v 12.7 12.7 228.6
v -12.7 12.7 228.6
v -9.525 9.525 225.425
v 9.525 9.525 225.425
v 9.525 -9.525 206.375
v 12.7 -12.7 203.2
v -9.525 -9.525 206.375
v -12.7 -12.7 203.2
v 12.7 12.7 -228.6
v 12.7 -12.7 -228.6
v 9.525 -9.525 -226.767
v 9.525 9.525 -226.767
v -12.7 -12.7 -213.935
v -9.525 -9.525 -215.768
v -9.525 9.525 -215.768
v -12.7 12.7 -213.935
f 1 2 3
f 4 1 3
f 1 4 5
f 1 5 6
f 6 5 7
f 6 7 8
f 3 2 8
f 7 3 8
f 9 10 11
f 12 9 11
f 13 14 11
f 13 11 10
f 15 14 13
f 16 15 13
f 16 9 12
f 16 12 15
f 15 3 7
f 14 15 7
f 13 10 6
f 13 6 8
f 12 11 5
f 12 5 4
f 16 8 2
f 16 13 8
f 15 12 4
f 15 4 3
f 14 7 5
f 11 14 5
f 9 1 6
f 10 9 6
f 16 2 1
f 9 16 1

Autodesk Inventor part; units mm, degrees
ref_plane "YZ Plane" through (0, 0, 0) normal (1, 0, 0) x (0, 1, 0)
ref_plane "XZ Plane" through (0, 0, 0) normal (0, 1, 0) x (-1, 0, 0)
ref_plane "XY Plane" through (0, 0, 0) normal (0, 0, 1) x (1, 0, 0)
sketch "Sketch1" plane through (0, 0, 0) normal (0, 0, 1) x (1, 0, 0)
  line L0 (-17.78, 0) -> (17.78, 0) projected
  line L1 (0, -17.78) -> (0, 17.78) projected
  line L2 (-12.7, 12.7) -> (12.7, 12.7)
  line L3 (12.7, 12.7) -> (12.7, -12.7)
  line L4 (12.7, -12.7) -> (-12.7, -12.7)
  line L5 (-12.7, -12.7) -> (-12.7, 12.7)
  line L6 (9.525, 9.525) -> (-9.525, 9.525)
  line L7 (-9.525, 9.525) -> (-9.525, -9.525)
  line L8 (-9.525, -9.525) -> (9.525, -9.525)
  line L9 (9.525, -9.525) -> (9.525, 9.525)
  point P0 (0, 0)
  point P1 (-12.7, 0)
  point P2 (0, 12.7)
  dimension "d0" = 25.4
  dimension "d1" = 3.175
extrude "Base" add sketch "Sketch1" along normal mid plane 457.2 contours L5 L2 L1 L6 L7 L0 | L0 L7 L8 L1 L4 L5 | L1 L8 L9 L0 L3 L4 | L2 L3 L0 L9 L6 L1
sketch "Sketch5" plane through (-12.7, -12.7, 228.6) normal (-1, 0, 0) x (0, 0, 1)
  line L0 (0, 0) -> (0, 25.4) projected
  line L1 (-457.2, 25.4) -> (0, 25.4) projected
  line L2 (0, 0) -> (-457.2, 0) projected
  line L3 (0, 25.4) -> (-25.4, 0)
  line L4 (-228.6, 25.4) -> (-228.6, 0) construction
  point P0 (-228.6, 12.7)
  dimension "d13" = 45
extrude "Extrusion5" cut sketch "Sketch5" against normal through all
sketch "Sketch6" plane through (-12.7, 12.7, -228.6) normal (0, 1, 0) x (1, 0, 0)
  line L0 (25.4, 0) -> (0, 0) projected
  line L1 (0, 0) -> (0, -457.2) projected
  line L2 (25.4, 0) -> (0, -14.6647)
  point P0 (12.7, -228.6)
  dimension "d16" = 30
extrude "Extrusion6" cut sketch "Sketch6" against normal through all
properties part number "tubing_template_0.125" material "Aluminum-6061"
